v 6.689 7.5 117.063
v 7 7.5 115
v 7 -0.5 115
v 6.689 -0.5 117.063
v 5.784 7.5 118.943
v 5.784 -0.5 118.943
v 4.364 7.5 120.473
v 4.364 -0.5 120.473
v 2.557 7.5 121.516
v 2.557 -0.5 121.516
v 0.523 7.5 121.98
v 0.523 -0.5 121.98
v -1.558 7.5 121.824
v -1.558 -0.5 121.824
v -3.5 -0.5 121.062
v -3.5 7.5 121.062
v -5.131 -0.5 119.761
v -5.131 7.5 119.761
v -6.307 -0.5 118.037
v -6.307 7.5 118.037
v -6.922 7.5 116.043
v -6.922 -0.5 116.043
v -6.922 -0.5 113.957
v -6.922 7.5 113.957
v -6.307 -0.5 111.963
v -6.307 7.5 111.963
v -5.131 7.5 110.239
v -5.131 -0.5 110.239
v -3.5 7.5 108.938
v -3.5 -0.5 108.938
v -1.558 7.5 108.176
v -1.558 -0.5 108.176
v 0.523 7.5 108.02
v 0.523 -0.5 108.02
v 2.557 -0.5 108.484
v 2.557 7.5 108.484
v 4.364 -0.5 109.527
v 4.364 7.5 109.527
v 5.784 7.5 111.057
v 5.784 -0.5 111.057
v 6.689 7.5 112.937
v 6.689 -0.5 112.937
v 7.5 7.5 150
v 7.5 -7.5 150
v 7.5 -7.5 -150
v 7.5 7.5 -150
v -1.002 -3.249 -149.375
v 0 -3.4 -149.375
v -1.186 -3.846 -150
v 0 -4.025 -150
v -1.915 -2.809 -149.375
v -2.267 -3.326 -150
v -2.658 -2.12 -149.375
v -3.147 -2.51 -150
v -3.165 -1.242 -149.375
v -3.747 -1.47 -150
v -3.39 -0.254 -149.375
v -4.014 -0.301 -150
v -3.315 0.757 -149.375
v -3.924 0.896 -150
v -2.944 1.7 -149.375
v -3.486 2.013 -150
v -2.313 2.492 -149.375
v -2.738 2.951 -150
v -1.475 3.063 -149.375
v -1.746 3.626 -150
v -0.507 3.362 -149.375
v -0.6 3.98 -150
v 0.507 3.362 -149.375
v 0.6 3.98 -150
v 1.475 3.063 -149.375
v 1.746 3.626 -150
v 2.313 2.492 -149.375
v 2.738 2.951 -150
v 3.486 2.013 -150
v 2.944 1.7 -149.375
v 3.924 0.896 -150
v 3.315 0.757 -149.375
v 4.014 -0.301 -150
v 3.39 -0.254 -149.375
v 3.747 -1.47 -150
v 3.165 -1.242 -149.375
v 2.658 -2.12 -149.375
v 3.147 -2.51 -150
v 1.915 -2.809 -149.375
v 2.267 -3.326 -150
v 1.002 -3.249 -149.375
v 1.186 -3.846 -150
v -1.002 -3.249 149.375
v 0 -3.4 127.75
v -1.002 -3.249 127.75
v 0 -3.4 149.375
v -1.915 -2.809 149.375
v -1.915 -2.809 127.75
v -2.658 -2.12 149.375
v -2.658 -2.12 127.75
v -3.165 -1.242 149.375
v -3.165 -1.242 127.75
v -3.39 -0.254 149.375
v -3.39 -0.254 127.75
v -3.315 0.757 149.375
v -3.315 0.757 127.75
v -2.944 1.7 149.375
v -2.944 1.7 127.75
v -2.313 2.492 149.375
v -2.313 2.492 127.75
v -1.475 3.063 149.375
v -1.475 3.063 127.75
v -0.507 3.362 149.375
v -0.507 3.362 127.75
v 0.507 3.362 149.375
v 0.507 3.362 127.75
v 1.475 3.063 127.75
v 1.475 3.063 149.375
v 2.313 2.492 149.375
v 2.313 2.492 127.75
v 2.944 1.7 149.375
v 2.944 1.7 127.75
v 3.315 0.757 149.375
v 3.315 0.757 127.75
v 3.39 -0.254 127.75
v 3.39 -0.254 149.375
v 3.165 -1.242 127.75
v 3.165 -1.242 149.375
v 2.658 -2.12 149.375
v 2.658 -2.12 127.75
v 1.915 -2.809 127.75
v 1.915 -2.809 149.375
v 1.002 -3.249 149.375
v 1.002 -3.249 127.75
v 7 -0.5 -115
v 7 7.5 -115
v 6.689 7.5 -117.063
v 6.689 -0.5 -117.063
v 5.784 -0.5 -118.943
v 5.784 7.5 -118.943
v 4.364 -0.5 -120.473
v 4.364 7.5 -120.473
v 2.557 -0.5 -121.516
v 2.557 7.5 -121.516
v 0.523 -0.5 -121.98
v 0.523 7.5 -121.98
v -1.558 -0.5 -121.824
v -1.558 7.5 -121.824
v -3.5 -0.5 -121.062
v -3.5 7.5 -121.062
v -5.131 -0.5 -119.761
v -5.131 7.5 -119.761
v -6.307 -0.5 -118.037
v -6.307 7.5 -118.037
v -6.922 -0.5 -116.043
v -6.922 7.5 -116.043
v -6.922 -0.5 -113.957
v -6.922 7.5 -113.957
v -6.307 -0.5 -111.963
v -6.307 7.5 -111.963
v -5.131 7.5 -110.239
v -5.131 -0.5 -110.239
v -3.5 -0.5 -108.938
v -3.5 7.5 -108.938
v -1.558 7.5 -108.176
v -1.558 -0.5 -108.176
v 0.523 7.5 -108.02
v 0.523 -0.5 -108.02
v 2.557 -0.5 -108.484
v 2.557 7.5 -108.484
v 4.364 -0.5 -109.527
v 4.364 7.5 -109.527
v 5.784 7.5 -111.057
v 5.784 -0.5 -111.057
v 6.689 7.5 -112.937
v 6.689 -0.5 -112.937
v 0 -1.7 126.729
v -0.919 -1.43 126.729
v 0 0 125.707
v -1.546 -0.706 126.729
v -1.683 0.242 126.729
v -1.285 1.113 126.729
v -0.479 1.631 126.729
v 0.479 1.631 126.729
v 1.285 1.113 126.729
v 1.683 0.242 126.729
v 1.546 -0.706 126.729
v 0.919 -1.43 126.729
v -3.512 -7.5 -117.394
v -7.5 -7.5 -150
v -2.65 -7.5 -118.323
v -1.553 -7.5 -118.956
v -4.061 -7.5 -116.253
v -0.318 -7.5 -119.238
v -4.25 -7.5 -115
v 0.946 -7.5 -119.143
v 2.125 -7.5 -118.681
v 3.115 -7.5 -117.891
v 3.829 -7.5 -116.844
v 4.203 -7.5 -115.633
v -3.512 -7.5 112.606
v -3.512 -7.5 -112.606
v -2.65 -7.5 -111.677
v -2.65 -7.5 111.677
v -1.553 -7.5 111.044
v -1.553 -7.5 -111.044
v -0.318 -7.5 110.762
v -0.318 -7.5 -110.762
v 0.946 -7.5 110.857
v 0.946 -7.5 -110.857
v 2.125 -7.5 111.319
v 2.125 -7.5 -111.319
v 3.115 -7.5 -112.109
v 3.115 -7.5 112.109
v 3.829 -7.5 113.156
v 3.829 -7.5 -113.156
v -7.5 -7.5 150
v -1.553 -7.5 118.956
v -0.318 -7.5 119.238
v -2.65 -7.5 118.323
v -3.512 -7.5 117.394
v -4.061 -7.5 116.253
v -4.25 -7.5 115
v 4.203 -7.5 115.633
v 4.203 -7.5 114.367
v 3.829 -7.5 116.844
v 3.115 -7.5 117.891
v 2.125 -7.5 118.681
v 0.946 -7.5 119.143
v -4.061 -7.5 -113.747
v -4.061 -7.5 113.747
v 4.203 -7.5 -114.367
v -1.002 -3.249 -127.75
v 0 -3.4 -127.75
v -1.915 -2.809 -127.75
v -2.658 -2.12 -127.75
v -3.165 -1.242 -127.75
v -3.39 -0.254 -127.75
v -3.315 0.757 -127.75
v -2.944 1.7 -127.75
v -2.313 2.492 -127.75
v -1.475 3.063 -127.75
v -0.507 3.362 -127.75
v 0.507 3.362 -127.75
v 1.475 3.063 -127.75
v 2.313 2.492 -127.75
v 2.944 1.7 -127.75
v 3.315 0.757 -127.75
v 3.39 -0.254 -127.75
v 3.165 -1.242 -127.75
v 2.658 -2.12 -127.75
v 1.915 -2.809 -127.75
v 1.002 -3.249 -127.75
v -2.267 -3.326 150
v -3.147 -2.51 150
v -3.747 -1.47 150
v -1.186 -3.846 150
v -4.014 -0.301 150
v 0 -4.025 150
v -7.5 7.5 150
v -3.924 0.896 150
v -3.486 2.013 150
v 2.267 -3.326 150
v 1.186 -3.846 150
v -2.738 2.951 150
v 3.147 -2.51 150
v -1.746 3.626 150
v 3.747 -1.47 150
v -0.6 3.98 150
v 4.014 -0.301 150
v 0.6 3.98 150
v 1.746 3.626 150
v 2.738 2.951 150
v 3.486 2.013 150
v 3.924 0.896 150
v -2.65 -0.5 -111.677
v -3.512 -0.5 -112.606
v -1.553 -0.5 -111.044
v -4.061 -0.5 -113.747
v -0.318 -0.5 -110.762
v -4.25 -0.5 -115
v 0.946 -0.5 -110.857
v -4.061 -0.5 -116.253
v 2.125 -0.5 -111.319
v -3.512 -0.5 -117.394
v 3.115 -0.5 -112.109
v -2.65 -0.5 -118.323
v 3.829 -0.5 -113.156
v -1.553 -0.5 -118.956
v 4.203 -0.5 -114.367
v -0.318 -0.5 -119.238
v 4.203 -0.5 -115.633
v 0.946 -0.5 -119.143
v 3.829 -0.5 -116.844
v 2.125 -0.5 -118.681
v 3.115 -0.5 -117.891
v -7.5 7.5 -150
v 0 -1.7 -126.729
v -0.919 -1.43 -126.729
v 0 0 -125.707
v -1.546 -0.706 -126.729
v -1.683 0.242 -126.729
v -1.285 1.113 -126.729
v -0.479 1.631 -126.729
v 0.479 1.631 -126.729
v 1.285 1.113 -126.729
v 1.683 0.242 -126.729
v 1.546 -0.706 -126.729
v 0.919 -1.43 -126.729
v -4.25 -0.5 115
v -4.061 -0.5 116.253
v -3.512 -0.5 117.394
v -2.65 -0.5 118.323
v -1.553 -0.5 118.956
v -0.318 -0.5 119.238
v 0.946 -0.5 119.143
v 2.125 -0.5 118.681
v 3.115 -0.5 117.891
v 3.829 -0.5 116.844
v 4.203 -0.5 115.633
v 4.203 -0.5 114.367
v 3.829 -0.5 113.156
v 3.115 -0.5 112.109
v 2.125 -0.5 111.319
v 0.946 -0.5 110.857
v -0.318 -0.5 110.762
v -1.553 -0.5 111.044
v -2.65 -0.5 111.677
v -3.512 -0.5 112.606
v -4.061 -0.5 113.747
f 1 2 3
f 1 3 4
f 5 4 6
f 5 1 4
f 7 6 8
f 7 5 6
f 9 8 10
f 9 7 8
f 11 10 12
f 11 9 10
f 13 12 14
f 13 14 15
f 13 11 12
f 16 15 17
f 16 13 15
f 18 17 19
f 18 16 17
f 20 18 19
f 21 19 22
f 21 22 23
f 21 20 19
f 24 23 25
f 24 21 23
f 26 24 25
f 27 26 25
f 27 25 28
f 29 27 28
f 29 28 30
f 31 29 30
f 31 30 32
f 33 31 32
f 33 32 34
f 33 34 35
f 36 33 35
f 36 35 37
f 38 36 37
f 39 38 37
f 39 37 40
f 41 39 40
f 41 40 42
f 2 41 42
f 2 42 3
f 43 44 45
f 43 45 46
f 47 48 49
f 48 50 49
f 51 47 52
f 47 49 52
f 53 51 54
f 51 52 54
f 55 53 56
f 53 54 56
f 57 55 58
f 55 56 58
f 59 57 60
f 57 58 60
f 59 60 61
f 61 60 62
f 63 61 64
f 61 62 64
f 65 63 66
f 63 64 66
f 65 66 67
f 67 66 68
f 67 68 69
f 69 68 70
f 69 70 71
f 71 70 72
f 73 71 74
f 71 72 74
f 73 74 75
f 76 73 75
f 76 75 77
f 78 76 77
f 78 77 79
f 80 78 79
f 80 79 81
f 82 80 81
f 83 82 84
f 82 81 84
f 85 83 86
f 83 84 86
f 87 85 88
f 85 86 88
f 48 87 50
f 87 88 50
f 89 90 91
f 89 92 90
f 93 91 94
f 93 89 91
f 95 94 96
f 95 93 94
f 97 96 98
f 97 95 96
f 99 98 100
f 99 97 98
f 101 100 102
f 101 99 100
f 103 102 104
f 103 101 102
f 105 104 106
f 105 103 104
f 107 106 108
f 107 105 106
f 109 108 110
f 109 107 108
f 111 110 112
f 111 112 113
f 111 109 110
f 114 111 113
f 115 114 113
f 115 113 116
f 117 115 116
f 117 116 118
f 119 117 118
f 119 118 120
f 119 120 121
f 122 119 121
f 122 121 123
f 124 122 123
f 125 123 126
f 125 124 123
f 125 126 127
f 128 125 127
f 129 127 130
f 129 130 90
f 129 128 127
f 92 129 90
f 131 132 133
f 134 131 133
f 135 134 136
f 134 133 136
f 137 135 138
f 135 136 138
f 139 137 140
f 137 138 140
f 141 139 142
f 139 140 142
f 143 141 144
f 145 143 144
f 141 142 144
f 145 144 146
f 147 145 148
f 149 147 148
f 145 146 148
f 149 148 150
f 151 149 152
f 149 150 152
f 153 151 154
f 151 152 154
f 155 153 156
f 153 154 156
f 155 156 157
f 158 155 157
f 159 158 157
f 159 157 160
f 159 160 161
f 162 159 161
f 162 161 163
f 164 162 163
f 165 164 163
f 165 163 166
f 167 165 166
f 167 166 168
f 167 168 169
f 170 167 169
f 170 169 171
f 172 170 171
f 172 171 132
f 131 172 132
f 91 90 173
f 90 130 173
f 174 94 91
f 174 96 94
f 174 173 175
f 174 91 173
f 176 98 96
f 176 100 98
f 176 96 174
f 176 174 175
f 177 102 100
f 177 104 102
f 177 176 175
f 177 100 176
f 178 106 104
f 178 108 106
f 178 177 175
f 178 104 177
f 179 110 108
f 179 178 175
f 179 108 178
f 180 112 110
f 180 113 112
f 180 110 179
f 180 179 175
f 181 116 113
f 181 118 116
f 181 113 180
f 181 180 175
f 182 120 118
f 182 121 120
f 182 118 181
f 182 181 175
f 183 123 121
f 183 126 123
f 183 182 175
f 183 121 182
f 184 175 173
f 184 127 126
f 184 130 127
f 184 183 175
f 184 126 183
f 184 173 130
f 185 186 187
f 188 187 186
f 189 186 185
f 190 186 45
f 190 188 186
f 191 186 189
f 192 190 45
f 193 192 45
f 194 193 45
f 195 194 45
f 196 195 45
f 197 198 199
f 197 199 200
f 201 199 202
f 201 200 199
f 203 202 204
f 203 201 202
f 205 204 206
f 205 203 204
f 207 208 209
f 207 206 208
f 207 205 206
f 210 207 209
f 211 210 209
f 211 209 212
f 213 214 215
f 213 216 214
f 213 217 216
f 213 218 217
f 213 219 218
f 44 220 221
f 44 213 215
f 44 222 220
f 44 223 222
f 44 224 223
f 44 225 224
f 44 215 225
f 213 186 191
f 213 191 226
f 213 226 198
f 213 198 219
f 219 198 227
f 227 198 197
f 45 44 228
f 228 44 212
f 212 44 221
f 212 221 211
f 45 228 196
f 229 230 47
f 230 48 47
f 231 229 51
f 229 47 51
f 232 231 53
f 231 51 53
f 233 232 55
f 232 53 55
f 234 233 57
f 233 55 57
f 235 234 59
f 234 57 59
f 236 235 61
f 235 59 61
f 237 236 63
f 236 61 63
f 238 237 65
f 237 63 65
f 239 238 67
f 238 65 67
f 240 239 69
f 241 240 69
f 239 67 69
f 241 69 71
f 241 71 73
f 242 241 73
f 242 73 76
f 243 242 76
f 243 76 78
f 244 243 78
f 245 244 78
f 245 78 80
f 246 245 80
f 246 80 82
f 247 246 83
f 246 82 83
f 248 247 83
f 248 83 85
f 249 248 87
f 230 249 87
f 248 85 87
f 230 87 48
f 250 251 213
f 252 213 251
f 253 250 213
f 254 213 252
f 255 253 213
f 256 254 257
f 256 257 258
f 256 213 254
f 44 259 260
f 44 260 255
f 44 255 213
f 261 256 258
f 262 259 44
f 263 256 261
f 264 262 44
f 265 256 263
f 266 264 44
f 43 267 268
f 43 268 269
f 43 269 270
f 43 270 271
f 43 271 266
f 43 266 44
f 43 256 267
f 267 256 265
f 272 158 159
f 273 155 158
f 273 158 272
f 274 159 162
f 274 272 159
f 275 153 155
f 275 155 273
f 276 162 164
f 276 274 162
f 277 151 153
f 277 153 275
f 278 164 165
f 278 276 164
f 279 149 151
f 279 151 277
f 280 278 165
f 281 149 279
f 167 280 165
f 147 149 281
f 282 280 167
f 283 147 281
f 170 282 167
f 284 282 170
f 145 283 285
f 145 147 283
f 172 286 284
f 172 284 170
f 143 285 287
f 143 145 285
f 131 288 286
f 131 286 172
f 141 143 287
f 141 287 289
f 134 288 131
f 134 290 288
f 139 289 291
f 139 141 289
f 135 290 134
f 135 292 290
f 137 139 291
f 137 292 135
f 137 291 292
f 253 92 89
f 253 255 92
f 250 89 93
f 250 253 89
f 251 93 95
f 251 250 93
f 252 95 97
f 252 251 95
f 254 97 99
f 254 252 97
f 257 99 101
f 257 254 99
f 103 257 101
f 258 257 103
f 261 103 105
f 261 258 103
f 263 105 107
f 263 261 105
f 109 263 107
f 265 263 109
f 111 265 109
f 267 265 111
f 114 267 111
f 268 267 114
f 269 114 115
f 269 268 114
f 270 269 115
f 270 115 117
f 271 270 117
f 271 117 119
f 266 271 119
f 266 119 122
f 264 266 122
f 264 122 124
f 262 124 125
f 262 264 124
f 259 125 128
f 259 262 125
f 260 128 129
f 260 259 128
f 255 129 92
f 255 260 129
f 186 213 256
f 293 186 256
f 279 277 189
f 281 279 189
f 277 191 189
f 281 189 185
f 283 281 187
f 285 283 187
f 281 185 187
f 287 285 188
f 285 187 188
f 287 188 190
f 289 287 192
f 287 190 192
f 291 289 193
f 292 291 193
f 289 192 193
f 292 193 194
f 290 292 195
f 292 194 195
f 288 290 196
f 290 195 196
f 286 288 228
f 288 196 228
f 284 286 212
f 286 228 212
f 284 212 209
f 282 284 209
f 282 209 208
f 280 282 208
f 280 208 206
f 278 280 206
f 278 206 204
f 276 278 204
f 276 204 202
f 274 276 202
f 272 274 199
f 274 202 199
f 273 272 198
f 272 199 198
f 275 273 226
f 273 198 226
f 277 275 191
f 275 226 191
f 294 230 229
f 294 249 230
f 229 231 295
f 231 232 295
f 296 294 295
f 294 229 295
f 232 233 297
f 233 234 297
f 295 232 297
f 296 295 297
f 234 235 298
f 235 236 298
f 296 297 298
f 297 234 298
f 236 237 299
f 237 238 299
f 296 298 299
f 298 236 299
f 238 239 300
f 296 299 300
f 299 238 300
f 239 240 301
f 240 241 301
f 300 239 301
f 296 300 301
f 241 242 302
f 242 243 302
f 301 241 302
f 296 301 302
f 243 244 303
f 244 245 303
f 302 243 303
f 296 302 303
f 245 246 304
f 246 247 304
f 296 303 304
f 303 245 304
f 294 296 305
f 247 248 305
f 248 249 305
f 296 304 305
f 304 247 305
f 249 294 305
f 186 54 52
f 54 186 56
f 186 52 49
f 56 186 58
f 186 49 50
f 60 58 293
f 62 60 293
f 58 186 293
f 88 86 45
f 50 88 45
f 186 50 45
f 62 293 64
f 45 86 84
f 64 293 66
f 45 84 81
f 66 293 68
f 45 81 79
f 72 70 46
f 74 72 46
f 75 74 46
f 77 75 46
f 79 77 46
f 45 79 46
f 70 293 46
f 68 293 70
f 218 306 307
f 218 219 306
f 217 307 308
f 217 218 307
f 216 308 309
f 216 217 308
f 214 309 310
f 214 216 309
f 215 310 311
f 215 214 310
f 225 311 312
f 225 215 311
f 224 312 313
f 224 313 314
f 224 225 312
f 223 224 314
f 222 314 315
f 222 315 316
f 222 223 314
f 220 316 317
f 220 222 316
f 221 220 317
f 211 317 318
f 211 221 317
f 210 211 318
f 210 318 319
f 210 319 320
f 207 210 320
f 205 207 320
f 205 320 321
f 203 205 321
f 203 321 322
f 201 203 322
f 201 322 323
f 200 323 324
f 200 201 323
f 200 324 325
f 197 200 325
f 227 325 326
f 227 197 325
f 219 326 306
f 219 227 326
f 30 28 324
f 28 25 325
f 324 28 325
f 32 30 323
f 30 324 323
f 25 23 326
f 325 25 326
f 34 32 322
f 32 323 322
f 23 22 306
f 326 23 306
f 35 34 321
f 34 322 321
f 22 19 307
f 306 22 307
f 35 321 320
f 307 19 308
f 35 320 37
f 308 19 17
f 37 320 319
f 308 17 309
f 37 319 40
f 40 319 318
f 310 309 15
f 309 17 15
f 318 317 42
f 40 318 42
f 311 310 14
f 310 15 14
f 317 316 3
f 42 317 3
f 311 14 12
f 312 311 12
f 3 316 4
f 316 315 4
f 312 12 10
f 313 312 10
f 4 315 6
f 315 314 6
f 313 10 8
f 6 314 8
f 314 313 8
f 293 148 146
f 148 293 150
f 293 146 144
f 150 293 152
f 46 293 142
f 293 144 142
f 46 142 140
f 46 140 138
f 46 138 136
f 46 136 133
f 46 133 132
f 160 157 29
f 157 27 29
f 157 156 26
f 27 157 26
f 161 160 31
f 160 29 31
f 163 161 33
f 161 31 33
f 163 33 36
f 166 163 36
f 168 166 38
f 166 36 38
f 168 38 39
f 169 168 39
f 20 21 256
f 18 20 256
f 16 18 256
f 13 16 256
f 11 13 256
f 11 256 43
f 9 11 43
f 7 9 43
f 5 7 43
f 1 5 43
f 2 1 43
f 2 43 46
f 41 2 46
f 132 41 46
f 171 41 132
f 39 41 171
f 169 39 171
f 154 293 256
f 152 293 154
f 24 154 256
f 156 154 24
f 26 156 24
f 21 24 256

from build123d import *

# Parameters (mm, degrees)
SKETCH1_W           = 15
SKETCH1_H           = 15
BOSS_EXTRUDE1_DEPTH = 150
HOLE1_D             = 8.5
HOLE1_CBORE_D       = 14
HOLE1_CBORE_DEPTH   = 8


with BuildPart() as part:
    # Sketch1 → Boss-Extrude1 (new, symmetric)
    with BuildSketch(Plane.XY):
        Rectangle(SKETCH1_W, SKETCH1_H)
    extrude(amount=BOSS_EXTRUDE1_DEPTH, both=True)

    # Sketch3 → M8 Tapped Hole1 (revolve, cut)
    with BuildSketch(Plane(origin=(0, 0, 150), x_dir=(0, -1, 0), z_dir=(1, 0, 0))):
        Polygon((0, 0), (0, 24.292926105), (3.4, 22.25), (3.4, 0.625), (4.025, 0), align=None)
    m8_tapped_hole1 = revolve(axis=Axis((0, 0, 156.35), (0, 0, -1)), mode=Mode.SUBTRACT)

    # Mirror1: M8 Tapped Hole1 across plane
    add(m8_tapped_hole1.mirror(Plane.XY), mode=Mode.SUBTRACT)

    # Hole1 (through all)
    with Locations(Plane(origin=(0, 7.5, 0), x_dir=(1, 0, 0), z_dir=(0, 1, 0))):
        with Locations((0, 115)):
            hole1 = CounterBoreHole(HOLE1_D / 2, HOLE1_CBORE_D / 2, HOLE1_CBORE_DEPTH)

    # Mirror2: Hole1 across plane
    add(hole1.mirror(Plane.XY), mode=Mode.SUBTRACT)


solid = part.part
